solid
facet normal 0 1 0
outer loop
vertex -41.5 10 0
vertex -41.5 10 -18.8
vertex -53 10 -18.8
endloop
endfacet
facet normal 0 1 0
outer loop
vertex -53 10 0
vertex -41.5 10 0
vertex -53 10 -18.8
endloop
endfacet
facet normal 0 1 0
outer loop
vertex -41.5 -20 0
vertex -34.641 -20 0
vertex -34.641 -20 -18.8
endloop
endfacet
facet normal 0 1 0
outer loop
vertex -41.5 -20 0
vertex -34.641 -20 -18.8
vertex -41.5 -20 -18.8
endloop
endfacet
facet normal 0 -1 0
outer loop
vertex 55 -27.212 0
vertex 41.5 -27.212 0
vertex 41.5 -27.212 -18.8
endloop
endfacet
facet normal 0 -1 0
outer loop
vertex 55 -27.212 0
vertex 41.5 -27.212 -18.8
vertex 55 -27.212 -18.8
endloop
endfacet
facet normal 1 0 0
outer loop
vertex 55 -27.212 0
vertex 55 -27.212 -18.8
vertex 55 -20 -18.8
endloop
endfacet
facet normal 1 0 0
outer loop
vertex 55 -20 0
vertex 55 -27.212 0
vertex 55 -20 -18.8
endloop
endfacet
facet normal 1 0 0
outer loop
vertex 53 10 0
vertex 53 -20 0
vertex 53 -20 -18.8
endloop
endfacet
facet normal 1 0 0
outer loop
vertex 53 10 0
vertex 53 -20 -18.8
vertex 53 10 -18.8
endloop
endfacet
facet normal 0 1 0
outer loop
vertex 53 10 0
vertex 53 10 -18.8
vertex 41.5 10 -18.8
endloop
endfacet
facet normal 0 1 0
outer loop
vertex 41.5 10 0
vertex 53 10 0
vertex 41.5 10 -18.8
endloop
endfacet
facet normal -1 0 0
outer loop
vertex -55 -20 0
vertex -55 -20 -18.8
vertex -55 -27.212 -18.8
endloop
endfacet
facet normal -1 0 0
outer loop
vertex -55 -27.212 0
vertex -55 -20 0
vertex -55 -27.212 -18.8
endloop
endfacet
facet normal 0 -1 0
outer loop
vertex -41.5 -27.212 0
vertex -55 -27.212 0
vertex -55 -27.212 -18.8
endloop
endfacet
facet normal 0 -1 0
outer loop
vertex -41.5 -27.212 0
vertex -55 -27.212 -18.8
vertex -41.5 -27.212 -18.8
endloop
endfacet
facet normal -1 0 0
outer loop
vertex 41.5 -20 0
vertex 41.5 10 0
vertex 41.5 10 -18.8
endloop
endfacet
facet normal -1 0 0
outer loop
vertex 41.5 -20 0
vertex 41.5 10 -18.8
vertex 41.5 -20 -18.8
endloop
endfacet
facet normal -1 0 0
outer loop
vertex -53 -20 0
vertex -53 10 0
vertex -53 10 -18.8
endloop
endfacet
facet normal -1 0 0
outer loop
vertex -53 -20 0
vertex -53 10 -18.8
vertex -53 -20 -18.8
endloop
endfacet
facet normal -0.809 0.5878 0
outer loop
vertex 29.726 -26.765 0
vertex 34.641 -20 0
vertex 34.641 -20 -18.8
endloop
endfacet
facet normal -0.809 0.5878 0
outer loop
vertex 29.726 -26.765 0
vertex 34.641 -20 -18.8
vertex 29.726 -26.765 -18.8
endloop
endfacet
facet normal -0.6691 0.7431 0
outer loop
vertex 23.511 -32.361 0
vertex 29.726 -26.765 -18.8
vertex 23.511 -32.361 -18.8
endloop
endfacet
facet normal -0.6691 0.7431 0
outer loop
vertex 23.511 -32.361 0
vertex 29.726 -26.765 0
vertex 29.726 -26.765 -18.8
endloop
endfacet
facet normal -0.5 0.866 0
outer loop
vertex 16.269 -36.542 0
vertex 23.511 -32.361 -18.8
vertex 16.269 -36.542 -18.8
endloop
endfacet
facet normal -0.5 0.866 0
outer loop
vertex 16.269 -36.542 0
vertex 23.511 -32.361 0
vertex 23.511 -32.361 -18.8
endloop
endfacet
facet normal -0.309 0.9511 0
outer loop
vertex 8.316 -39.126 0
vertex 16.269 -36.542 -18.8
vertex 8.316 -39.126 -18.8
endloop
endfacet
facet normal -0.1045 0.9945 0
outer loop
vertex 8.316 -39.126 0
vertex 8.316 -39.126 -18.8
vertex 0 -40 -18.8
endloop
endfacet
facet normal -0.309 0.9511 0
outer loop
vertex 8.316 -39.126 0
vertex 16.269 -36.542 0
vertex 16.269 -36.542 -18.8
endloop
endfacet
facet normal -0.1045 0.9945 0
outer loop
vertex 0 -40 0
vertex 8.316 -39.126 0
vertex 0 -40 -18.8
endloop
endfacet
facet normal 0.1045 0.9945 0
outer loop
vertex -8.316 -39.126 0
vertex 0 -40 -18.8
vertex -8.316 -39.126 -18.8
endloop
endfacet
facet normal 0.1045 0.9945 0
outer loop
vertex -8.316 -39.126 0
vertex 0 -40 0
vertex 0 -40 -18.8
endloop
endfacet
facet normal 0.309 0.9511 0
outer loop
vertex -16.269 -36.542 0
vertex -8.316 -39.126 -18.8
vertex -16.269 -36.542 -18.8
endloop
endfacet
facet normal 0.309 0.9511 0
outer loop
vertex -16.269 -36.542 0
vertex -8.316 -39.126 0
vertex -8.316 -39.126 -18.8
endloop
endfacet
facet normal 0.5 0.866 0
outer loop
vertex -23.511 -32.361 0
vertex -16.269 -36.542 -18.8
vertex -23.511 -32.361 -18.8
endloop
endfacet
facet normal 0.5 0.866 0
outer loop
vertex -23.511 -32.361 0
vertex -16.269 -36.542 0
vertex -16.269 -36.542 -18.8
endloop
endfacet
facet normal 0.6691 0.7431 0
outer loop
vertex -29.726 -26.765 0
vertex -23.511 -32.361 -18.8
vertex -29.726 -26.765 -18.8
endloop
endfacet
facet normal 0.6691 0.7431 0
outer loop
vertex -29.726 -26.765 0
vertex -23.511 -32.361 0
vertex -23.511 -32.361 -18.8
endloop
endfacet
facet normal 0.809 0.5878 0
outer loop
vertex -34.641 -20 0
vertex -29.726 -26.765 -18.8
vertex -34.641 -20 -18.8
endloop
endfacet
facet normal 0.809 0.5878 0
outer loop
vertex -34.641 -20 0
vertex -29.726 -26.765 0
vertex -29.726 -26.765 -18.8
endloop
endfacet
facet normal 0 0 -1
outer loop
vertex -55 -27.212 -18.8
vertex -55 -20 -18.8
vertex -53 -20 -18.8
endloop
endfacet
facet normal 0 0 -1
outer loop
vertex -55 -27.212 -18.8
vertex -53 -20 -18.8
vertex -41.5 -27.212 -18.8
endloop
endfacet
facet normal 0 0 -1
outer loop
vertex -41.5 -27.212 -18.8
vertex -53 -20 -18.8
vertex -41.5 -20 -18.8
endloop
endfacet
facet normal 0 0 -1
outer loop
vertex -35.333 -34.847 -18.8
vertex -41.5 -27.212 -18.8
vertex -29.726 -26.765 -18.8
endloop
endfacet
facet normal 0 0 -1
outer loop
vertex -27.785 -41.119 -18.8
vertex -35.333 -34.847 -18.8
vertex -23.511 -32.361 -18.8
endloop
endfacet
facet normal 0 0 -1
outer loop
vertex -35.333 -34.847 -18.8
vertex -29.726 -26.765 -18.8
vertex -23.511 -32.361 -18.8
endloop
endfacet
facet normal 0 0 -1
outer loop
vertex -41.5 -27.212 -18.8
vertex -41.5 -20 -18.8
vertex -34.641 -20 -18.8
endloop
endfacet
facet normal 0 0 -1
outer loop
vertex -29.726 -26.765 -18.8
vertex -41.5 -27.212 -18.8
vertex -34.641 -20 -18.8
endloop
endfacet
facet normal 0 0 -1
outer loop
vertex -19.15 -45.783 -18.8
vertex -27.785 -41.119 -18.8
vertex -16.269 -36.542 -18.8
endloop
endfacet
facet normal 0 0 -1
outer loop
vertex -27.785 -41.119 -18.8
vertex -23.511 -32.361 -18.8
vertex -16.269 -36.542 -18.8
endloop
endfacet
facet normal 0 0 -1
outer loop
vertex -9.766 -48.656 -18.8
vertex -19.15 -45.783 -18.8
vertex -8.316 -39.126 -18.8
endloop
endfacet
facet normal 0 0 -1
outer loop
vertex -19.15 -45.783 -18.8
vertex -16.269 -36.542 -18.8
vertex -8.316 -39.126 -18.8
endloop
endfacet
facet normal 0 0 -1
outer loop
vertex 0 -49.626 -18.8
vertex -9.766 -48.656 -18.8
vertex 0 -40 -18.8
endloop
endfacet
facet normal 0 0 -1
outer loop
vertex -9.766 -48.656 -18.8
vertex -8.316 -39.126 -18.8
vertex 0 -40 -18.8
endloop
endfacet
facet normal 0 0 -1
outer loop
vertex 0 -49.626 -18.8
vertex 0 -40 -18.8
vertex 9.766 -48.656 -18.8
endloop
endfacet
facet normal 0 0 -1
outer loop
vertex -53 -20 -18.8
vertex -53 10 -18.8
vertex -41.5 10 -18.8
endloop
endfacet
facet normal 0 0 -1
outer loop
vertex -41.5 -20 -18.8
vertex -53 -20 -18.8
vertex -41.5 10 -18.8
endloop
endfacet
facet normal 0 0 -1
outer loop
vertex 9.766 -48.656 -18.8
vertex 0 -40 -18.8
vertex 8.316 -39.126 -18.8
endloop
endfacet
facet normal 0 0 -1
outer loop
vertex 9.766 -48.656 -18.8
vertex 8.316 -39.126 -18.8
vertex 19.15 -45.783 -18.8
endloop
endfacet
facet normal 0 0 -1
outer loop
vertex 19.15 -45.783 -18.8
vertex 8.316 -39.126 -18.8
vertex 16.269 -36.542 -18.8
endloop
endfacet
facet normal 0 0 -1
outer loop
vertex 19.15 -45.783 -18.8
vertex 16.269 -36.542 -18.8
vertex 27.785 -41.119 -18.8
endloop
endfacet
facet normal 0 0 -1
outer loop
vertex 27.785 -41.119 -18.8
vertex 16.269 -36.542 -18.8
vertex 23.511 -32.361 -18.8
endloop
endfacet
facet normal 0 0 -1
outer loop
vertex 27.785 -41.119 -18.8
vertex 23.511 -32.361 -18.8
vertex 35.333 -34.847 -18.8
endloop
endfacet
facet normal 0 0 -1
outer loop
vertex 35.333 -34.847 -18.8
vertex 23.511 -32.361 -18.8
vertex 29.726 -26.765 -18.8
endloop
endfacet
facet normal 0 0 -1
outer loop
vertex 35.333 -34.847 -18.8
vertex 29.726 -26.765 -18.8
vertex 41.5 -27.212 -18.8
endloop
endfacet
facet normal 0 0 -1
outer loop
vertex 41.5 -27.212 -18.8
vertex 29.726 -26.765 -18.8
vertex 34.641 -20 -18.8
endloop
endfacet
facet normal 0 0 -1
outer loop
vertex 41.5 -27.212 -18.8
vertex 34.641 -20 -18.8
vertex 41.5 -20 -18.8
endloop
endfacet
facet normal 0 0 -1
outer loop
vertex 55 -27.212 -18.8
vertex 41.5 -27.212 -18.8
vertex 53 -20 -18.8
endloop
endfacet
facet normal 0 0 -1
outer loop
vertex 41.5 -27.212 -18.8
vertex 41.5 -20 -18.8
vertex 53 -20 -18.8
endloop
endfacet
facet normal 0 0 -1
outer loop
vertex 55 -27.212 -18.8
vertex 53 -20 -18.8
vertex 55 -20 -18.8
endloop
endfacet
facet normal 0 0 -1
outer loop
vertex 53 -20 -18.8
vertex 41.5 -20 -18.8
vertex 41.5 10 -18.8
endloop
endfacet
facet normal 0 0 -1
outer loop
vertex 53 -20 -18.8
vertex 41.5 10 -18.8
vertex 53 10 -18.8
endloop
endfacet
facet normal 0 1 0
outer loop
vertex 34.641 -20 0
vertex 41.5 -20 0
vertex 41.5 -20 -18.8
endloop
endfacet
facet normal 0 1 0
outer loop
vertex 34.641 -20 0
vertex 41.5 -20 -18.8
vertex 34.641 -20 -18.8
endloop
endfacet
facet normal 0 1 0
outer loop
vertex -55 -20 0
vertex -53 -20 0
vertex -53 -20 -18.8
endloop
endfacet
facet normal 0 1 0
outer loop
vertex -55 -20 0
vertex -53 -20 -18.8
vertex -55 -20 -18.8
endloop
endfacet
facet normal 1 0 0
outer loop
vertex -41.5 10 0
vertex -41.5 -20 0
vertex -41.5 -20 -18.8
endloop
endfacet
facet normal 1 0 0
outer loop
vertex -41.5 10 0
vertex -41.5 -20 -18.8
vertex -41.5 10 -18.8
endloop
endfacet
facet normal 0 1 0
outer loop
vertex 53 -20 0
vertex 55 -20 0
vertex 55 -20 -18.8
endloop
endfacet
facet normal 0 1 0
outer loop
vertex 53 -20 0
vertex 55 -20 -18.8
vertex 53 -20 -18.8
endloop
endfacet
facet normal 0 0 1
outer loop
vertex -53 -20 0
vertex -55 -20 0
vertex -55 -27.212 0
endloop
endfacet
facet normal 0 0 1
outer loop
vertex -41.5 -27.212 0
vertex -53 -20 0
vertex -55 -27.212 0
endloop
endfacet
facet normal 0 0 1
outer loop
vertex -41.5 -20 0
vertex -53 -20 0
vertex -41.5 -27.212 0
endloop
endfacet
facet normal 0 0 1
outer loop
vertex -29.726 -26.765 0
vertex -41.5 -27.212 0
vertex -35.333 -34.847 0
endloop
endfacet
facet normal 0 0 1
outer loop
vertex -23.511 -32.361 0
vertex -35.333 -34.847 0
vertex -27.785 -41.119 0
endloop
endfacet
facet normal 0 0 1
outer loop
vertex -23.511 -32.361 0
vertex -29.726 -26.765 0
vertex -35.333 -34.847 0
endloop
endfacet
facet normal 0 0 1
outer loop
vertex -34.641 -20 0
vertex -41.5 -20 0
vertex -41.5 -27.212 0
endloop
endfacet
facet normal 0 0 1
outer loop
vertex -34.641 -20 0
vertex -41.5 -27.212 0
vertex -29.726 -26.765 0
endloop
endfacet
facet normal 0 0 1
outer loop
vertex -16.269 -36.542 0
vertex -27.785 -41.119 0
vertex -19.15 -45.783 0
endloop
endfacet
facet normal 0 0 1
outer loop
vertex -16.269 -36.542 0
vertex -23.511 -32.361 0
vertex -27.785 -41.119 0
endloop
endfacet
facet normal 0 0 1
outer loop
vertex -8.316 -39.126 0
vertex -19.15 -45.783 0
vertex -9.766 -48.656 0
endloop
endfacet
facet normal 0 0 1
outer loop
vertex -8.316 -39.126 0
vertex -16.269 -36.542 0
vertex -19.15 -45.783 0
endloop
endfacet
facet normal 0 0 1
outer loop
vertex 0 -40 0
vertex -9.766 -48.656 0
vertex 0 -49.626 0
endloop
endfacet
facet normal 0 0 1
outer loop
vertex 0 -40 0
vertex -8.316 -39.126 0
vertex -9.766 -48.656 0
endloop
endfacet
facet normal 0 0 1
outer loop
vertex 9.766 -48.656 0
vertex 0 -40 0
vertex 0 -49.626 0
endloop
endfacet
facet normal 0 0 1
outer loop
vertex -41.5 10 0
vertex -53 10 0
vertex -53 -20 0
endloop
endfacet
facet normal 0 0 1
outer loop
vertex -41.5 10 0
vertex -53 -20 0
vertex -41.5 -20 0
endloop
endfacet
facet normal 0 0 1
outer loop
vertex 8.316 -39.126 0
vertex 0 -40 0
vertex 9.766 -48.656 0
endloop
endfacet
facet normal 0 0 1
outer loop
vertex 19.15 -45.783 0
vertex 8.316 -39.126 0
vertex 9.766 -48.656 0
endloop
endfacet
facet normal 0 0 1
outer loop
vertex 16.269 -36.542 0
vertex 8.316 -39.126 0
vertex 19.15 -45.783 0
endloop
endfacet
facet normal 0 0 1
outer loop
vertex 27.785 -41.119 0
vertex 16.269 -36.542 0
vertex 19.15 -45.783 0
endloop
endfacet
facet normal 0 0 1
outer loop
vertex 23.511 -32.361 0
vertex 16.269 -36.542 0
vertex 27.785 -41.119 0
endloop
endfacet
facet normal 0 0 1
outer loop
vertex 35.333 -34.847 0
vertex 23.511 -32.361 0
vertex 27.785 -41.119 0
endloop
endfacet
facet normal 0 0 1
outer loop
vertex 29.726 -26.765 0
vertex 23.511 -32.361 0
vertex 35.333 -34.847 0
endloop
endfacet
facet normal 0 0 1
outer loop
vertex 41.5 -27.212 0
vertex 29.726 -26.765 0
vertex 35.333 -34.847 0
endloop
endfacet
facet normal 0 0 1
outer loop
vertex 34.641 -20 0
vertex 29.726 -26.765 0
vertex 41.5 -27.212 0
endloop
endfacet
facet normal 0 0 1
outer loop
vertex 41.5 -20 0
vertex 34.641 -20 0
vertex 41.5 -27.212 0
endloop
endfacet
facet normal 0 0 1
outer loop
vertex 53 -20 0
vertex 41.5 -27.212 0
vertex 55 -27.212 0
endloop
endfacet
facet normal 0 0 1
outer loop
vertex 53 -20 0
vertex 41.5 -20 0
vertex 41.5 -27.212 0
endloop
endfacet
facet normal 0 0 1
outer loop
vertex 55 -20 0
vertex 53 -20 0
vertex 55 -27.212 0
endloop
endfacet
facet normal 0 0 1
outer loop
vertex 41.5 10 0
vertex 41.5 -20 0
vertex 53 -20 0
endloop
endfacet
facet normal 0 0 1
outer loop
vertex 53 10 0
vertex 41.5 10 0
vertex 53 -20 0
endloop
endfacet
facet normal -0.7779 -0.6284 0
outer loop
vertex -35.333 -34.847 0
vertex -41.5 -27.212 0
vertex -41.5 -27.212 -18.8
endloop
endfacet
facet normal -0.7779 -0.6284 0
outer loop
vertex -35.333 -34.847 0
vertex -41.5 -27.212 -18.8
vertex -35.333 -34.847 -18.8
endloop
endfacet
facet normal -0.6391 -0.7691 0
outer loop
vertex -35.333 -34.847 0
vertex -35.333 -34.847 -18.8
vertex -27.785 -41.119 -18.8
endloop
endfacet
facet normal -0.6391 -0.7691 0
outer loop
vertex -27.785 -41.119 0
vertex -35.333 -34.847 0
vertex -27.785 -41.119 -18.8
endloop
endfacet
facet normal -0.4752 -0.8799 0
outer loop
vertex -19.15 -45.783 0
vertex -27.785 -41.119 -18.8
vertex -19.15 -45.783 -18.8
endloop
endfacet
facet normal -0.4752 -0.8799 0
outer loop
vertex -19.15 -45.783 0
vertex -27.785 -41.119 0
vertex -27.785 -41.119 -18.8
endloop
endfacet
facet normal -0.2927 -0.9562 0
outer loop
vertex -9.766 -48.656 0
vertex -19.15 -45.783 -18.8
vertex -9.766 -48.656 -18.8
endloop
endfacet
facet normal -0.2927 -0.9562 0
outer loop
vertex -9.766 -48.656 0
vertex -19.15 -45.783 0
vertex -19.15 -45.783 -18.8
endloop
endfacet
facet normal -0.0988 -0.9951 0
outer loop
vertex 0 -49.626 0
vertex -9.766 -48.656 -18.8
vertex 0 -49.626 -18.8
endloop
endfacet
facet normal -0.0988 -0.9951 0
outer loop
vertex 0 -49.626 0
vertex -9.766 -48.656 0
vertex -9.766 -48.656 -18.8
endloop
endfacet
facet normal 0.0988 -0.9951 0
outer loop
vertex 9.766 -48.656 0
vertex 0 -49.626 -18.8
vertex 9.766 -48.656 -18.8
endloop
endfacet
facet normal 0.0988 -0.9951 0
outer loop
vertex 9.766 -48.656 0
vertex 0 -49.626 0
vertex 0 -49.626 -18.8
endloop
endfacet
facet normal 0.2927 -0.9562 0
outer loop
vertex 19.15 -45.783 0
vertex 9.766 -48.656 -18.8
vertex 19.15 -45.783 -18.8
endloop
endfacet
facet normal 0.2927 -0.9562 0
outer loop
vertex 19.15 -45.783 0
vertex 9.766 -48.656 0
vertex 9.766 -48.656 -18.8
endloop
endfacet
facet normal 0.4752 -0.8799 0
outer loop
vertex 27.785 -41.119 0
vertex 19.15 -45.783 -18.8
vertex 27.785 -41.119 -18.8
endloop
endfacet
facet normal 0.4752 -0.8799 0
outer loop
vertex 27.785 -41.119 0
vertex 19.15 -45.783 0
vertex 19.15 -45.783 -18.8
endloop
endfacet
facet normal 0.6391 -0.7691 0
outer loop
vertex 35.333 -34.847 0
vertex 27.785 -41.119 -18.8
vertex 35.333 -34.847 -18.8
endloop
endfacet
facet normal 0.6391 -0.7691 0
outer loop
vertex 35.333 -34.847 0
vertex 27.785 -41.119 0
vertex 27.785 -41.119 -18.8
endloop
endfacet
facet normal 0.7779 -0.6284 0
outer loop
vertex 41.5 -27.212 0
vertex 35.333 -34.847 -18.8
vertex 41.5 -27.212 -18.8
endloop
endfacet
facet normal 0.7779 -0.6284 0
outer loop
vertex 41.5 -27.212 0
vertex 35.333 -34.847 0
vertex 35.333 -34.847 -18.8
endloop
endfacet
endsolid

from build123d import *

# Parameters (mm, degrees)
BOSS_EXTRUDE1_DEPTH = 18.8


with BuildPart() as part:
    # Sketch1 → Boss-Extrude1 (new body)
    with BuildSketch(Plane.XY):
        with BuildLine():
            Line((41.5, -20), (34.641016151, -20))
            ThreePointArc((34.641016151, -20), (0, -40), (-34.641016151, -20))
            Line((-34.641016151, -20), (-41.5, -20))
            Line((-41.5, -20), (-41.5, 10))
            Line((-41.5, 10), (-53, 10))
            Line((-53, 10), (-53, -20))
            Line((-53, -20), (-55, -20))
            Line((-55, -20), (-55, -27.212333234))
            Line((-55, -27.212333234), (-41.5, -27.212333234))
            ThreePointArc((-41.5, -27.212333234), (0, -49.626213638), (41.5, -27.212333234))
            Line((41.5, -27.212333234), (55, -27.212333234))
            Line((55, -27.212333234), (55, -20))
            Line((55, -20), (53, -20))
            Line((53, -20), (53, 10))
            Line((53, 10), (41.5, 10))
            Line((41.5, 10), (41.5, -20))
        make_face()
    extrude(amount=-BOSS_EXTRUDE1_DEPTH)


solid = part.part
